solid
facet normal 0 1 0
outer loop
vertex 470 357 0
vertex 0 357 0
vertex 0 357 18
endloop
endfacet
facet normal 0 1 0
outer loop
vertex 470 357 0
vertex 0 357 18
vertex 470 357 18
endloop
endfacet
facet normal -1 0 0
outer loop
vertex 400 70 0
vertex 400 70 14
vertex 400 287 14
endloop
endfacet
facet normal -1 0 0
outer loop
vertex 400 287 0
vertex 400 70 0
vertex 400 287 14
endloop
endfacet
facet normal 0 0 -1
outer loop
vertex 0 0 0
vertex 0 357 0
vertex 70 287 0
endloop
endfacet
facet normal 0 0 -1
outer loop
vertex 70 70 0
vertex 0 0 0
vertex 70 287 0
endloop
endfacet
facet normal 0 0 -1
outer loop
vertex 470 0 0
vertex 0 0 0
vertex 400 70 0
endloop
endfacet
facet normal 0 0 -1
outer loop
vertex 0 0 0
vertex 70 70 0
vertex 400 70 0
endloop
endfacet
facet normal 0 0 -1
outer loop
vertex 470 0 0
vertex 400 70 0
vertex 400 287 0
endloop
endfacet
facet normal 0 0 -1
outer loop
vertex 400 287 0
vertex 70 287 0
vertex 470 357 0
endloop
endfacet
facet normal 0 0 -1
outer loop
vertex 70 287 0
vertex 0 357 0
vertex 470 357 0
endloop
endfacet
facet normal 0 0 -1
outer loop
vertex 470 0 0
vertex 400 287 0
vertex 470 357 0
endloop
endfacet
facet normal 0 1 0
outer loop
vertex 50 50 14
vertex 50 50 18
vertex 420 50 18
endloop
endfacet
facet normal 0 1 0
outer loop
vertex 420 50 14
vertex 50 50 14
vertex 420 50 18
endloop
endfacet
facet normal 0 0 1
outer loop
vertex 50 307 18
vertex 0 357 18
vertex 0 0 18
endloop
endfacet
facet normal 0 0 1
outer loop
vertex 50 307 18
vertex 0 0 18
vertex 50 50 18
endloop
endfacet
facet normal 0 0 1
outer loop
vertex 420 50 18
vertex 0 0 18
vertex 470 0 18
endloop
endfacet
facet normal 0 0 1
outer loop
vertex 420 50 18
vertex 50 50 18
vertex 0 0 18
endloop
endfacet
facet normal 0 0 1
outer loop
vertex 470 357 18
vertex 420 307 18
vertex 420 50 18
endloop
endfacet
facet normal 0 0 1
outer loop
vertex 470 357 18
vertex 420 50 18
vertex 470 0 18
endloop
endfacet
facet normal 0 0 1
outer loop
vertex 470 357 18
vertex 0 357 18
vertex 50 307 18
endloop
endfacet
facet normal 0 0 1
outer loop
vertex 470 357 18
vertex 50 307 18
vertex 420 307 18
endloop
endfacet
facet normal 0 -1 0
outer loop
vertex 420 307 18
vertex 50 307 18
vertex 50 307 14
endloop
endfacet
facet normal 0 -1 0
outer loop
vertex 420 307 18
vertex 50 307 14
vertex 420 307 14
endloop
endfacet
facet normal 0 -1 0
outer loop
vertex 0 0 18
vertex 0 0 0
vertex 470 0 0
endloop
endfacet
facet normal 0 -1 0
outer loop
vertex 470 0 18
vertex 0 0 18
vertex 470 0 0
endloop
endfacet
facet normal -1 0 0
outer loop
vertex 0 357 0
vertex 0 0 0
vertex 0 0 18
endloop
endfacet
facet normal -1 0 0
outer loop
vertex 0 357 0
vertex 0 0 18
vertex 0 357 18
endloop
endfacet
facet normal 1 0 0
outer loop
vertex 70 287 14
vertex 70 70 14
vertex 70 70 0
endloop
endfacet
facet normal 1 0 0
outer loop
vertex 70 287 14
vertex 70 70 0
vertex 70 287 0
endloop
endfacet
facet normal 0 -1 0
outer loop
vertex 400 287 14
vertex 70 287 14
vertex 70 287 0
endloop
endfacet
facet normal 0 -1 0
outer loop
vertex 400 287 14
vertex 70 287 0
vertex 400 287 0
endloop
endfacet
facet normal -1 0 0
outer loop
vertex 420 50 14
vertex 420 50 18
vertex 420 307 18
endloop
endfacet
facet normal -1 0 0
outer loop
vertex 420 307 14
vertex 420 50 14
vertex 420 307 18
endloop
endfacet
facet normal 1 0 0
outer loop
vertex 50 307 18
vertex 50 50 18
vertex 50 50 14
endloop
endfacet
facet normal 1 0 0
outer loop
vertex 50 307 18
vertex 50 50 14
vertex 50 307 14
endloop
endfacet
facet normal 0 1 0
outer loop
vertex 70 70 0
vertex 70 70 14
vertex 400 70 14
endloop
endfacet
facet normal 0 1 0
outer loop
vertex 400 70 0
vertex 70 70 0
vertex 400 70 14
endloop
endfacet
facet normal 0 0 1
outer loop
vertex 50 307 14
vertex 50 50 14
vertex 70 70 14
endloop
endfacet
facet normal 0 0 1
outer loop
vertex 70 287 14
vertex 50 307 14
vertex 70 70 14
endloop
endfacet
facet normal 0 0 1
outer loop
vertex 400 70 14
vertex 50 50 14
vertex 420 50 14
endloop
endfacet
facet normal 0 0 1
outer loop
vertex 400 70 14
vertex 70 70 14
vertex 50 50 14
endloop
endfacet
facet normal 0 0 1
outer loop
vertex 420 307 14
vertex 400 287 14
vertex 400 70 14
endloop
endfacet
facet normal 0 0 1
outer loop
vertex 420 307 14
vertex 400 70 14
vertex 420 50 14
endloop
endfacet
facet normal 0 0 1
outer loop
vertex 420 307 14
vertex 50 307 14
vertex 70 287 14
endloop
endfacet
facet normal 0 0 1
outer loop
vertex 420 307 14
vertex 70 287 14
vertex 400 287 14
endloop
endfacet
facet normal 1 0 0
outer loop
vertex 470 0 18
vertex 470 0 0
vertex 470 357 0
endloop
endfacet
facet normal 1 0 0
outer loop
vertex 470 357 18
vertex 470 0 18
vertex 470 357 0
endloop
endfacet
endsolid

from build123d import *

# Parameters (mm, degrees)
SKETCH1_W           = 470
SKETCH1_H           = 357
BOSS_EXTRUDE1_DEPTH = 18
SKETCH3_W           = 370
SKETCH3_H           = 257
CUT_EXTRUDE1_DEPTH  = 4
SKETCH4_W           = 330
SKETCH4_H           = 217
CUT_EXTRUDE2_DEPTH  = 591.376998197


with BuildPart() as part:
    # Sketch1 → Boss-Extrude1 (new body)
    with BuildSketch(Plane.XY):
        with Locations((235, 178.5)):
            Rectangle(SKETCH1_W, SKETCH1_H)
    extrude(amount=BOSS_EXTRUDE1_DEPTH)

    # Sketch3 → Cut-Extrude1 (cut)
    with BuildSketch(Plane.XY.offset(18)):
        with Locations((235, 178.5)):
            Rectangle(SKETCH3_W, SKETCH3_H)
    extrude(amount=-CUT_EXTRUDE1_DEPTH, mode=Mode.SUBTRACT)

    # Sketch4 → Cut-Extrude2 (cut, through all)
    with BuildSketch(Plane.XY.offset(14)):
        with Locations((235, 178.5)):
            Rectangle(SKETCH4_W, SKETCH4_H)
    extrude(amount=-CUT_EXTRUDE2_DEPTH, mode=Mode.SUBTRACT)


solid = part.part
